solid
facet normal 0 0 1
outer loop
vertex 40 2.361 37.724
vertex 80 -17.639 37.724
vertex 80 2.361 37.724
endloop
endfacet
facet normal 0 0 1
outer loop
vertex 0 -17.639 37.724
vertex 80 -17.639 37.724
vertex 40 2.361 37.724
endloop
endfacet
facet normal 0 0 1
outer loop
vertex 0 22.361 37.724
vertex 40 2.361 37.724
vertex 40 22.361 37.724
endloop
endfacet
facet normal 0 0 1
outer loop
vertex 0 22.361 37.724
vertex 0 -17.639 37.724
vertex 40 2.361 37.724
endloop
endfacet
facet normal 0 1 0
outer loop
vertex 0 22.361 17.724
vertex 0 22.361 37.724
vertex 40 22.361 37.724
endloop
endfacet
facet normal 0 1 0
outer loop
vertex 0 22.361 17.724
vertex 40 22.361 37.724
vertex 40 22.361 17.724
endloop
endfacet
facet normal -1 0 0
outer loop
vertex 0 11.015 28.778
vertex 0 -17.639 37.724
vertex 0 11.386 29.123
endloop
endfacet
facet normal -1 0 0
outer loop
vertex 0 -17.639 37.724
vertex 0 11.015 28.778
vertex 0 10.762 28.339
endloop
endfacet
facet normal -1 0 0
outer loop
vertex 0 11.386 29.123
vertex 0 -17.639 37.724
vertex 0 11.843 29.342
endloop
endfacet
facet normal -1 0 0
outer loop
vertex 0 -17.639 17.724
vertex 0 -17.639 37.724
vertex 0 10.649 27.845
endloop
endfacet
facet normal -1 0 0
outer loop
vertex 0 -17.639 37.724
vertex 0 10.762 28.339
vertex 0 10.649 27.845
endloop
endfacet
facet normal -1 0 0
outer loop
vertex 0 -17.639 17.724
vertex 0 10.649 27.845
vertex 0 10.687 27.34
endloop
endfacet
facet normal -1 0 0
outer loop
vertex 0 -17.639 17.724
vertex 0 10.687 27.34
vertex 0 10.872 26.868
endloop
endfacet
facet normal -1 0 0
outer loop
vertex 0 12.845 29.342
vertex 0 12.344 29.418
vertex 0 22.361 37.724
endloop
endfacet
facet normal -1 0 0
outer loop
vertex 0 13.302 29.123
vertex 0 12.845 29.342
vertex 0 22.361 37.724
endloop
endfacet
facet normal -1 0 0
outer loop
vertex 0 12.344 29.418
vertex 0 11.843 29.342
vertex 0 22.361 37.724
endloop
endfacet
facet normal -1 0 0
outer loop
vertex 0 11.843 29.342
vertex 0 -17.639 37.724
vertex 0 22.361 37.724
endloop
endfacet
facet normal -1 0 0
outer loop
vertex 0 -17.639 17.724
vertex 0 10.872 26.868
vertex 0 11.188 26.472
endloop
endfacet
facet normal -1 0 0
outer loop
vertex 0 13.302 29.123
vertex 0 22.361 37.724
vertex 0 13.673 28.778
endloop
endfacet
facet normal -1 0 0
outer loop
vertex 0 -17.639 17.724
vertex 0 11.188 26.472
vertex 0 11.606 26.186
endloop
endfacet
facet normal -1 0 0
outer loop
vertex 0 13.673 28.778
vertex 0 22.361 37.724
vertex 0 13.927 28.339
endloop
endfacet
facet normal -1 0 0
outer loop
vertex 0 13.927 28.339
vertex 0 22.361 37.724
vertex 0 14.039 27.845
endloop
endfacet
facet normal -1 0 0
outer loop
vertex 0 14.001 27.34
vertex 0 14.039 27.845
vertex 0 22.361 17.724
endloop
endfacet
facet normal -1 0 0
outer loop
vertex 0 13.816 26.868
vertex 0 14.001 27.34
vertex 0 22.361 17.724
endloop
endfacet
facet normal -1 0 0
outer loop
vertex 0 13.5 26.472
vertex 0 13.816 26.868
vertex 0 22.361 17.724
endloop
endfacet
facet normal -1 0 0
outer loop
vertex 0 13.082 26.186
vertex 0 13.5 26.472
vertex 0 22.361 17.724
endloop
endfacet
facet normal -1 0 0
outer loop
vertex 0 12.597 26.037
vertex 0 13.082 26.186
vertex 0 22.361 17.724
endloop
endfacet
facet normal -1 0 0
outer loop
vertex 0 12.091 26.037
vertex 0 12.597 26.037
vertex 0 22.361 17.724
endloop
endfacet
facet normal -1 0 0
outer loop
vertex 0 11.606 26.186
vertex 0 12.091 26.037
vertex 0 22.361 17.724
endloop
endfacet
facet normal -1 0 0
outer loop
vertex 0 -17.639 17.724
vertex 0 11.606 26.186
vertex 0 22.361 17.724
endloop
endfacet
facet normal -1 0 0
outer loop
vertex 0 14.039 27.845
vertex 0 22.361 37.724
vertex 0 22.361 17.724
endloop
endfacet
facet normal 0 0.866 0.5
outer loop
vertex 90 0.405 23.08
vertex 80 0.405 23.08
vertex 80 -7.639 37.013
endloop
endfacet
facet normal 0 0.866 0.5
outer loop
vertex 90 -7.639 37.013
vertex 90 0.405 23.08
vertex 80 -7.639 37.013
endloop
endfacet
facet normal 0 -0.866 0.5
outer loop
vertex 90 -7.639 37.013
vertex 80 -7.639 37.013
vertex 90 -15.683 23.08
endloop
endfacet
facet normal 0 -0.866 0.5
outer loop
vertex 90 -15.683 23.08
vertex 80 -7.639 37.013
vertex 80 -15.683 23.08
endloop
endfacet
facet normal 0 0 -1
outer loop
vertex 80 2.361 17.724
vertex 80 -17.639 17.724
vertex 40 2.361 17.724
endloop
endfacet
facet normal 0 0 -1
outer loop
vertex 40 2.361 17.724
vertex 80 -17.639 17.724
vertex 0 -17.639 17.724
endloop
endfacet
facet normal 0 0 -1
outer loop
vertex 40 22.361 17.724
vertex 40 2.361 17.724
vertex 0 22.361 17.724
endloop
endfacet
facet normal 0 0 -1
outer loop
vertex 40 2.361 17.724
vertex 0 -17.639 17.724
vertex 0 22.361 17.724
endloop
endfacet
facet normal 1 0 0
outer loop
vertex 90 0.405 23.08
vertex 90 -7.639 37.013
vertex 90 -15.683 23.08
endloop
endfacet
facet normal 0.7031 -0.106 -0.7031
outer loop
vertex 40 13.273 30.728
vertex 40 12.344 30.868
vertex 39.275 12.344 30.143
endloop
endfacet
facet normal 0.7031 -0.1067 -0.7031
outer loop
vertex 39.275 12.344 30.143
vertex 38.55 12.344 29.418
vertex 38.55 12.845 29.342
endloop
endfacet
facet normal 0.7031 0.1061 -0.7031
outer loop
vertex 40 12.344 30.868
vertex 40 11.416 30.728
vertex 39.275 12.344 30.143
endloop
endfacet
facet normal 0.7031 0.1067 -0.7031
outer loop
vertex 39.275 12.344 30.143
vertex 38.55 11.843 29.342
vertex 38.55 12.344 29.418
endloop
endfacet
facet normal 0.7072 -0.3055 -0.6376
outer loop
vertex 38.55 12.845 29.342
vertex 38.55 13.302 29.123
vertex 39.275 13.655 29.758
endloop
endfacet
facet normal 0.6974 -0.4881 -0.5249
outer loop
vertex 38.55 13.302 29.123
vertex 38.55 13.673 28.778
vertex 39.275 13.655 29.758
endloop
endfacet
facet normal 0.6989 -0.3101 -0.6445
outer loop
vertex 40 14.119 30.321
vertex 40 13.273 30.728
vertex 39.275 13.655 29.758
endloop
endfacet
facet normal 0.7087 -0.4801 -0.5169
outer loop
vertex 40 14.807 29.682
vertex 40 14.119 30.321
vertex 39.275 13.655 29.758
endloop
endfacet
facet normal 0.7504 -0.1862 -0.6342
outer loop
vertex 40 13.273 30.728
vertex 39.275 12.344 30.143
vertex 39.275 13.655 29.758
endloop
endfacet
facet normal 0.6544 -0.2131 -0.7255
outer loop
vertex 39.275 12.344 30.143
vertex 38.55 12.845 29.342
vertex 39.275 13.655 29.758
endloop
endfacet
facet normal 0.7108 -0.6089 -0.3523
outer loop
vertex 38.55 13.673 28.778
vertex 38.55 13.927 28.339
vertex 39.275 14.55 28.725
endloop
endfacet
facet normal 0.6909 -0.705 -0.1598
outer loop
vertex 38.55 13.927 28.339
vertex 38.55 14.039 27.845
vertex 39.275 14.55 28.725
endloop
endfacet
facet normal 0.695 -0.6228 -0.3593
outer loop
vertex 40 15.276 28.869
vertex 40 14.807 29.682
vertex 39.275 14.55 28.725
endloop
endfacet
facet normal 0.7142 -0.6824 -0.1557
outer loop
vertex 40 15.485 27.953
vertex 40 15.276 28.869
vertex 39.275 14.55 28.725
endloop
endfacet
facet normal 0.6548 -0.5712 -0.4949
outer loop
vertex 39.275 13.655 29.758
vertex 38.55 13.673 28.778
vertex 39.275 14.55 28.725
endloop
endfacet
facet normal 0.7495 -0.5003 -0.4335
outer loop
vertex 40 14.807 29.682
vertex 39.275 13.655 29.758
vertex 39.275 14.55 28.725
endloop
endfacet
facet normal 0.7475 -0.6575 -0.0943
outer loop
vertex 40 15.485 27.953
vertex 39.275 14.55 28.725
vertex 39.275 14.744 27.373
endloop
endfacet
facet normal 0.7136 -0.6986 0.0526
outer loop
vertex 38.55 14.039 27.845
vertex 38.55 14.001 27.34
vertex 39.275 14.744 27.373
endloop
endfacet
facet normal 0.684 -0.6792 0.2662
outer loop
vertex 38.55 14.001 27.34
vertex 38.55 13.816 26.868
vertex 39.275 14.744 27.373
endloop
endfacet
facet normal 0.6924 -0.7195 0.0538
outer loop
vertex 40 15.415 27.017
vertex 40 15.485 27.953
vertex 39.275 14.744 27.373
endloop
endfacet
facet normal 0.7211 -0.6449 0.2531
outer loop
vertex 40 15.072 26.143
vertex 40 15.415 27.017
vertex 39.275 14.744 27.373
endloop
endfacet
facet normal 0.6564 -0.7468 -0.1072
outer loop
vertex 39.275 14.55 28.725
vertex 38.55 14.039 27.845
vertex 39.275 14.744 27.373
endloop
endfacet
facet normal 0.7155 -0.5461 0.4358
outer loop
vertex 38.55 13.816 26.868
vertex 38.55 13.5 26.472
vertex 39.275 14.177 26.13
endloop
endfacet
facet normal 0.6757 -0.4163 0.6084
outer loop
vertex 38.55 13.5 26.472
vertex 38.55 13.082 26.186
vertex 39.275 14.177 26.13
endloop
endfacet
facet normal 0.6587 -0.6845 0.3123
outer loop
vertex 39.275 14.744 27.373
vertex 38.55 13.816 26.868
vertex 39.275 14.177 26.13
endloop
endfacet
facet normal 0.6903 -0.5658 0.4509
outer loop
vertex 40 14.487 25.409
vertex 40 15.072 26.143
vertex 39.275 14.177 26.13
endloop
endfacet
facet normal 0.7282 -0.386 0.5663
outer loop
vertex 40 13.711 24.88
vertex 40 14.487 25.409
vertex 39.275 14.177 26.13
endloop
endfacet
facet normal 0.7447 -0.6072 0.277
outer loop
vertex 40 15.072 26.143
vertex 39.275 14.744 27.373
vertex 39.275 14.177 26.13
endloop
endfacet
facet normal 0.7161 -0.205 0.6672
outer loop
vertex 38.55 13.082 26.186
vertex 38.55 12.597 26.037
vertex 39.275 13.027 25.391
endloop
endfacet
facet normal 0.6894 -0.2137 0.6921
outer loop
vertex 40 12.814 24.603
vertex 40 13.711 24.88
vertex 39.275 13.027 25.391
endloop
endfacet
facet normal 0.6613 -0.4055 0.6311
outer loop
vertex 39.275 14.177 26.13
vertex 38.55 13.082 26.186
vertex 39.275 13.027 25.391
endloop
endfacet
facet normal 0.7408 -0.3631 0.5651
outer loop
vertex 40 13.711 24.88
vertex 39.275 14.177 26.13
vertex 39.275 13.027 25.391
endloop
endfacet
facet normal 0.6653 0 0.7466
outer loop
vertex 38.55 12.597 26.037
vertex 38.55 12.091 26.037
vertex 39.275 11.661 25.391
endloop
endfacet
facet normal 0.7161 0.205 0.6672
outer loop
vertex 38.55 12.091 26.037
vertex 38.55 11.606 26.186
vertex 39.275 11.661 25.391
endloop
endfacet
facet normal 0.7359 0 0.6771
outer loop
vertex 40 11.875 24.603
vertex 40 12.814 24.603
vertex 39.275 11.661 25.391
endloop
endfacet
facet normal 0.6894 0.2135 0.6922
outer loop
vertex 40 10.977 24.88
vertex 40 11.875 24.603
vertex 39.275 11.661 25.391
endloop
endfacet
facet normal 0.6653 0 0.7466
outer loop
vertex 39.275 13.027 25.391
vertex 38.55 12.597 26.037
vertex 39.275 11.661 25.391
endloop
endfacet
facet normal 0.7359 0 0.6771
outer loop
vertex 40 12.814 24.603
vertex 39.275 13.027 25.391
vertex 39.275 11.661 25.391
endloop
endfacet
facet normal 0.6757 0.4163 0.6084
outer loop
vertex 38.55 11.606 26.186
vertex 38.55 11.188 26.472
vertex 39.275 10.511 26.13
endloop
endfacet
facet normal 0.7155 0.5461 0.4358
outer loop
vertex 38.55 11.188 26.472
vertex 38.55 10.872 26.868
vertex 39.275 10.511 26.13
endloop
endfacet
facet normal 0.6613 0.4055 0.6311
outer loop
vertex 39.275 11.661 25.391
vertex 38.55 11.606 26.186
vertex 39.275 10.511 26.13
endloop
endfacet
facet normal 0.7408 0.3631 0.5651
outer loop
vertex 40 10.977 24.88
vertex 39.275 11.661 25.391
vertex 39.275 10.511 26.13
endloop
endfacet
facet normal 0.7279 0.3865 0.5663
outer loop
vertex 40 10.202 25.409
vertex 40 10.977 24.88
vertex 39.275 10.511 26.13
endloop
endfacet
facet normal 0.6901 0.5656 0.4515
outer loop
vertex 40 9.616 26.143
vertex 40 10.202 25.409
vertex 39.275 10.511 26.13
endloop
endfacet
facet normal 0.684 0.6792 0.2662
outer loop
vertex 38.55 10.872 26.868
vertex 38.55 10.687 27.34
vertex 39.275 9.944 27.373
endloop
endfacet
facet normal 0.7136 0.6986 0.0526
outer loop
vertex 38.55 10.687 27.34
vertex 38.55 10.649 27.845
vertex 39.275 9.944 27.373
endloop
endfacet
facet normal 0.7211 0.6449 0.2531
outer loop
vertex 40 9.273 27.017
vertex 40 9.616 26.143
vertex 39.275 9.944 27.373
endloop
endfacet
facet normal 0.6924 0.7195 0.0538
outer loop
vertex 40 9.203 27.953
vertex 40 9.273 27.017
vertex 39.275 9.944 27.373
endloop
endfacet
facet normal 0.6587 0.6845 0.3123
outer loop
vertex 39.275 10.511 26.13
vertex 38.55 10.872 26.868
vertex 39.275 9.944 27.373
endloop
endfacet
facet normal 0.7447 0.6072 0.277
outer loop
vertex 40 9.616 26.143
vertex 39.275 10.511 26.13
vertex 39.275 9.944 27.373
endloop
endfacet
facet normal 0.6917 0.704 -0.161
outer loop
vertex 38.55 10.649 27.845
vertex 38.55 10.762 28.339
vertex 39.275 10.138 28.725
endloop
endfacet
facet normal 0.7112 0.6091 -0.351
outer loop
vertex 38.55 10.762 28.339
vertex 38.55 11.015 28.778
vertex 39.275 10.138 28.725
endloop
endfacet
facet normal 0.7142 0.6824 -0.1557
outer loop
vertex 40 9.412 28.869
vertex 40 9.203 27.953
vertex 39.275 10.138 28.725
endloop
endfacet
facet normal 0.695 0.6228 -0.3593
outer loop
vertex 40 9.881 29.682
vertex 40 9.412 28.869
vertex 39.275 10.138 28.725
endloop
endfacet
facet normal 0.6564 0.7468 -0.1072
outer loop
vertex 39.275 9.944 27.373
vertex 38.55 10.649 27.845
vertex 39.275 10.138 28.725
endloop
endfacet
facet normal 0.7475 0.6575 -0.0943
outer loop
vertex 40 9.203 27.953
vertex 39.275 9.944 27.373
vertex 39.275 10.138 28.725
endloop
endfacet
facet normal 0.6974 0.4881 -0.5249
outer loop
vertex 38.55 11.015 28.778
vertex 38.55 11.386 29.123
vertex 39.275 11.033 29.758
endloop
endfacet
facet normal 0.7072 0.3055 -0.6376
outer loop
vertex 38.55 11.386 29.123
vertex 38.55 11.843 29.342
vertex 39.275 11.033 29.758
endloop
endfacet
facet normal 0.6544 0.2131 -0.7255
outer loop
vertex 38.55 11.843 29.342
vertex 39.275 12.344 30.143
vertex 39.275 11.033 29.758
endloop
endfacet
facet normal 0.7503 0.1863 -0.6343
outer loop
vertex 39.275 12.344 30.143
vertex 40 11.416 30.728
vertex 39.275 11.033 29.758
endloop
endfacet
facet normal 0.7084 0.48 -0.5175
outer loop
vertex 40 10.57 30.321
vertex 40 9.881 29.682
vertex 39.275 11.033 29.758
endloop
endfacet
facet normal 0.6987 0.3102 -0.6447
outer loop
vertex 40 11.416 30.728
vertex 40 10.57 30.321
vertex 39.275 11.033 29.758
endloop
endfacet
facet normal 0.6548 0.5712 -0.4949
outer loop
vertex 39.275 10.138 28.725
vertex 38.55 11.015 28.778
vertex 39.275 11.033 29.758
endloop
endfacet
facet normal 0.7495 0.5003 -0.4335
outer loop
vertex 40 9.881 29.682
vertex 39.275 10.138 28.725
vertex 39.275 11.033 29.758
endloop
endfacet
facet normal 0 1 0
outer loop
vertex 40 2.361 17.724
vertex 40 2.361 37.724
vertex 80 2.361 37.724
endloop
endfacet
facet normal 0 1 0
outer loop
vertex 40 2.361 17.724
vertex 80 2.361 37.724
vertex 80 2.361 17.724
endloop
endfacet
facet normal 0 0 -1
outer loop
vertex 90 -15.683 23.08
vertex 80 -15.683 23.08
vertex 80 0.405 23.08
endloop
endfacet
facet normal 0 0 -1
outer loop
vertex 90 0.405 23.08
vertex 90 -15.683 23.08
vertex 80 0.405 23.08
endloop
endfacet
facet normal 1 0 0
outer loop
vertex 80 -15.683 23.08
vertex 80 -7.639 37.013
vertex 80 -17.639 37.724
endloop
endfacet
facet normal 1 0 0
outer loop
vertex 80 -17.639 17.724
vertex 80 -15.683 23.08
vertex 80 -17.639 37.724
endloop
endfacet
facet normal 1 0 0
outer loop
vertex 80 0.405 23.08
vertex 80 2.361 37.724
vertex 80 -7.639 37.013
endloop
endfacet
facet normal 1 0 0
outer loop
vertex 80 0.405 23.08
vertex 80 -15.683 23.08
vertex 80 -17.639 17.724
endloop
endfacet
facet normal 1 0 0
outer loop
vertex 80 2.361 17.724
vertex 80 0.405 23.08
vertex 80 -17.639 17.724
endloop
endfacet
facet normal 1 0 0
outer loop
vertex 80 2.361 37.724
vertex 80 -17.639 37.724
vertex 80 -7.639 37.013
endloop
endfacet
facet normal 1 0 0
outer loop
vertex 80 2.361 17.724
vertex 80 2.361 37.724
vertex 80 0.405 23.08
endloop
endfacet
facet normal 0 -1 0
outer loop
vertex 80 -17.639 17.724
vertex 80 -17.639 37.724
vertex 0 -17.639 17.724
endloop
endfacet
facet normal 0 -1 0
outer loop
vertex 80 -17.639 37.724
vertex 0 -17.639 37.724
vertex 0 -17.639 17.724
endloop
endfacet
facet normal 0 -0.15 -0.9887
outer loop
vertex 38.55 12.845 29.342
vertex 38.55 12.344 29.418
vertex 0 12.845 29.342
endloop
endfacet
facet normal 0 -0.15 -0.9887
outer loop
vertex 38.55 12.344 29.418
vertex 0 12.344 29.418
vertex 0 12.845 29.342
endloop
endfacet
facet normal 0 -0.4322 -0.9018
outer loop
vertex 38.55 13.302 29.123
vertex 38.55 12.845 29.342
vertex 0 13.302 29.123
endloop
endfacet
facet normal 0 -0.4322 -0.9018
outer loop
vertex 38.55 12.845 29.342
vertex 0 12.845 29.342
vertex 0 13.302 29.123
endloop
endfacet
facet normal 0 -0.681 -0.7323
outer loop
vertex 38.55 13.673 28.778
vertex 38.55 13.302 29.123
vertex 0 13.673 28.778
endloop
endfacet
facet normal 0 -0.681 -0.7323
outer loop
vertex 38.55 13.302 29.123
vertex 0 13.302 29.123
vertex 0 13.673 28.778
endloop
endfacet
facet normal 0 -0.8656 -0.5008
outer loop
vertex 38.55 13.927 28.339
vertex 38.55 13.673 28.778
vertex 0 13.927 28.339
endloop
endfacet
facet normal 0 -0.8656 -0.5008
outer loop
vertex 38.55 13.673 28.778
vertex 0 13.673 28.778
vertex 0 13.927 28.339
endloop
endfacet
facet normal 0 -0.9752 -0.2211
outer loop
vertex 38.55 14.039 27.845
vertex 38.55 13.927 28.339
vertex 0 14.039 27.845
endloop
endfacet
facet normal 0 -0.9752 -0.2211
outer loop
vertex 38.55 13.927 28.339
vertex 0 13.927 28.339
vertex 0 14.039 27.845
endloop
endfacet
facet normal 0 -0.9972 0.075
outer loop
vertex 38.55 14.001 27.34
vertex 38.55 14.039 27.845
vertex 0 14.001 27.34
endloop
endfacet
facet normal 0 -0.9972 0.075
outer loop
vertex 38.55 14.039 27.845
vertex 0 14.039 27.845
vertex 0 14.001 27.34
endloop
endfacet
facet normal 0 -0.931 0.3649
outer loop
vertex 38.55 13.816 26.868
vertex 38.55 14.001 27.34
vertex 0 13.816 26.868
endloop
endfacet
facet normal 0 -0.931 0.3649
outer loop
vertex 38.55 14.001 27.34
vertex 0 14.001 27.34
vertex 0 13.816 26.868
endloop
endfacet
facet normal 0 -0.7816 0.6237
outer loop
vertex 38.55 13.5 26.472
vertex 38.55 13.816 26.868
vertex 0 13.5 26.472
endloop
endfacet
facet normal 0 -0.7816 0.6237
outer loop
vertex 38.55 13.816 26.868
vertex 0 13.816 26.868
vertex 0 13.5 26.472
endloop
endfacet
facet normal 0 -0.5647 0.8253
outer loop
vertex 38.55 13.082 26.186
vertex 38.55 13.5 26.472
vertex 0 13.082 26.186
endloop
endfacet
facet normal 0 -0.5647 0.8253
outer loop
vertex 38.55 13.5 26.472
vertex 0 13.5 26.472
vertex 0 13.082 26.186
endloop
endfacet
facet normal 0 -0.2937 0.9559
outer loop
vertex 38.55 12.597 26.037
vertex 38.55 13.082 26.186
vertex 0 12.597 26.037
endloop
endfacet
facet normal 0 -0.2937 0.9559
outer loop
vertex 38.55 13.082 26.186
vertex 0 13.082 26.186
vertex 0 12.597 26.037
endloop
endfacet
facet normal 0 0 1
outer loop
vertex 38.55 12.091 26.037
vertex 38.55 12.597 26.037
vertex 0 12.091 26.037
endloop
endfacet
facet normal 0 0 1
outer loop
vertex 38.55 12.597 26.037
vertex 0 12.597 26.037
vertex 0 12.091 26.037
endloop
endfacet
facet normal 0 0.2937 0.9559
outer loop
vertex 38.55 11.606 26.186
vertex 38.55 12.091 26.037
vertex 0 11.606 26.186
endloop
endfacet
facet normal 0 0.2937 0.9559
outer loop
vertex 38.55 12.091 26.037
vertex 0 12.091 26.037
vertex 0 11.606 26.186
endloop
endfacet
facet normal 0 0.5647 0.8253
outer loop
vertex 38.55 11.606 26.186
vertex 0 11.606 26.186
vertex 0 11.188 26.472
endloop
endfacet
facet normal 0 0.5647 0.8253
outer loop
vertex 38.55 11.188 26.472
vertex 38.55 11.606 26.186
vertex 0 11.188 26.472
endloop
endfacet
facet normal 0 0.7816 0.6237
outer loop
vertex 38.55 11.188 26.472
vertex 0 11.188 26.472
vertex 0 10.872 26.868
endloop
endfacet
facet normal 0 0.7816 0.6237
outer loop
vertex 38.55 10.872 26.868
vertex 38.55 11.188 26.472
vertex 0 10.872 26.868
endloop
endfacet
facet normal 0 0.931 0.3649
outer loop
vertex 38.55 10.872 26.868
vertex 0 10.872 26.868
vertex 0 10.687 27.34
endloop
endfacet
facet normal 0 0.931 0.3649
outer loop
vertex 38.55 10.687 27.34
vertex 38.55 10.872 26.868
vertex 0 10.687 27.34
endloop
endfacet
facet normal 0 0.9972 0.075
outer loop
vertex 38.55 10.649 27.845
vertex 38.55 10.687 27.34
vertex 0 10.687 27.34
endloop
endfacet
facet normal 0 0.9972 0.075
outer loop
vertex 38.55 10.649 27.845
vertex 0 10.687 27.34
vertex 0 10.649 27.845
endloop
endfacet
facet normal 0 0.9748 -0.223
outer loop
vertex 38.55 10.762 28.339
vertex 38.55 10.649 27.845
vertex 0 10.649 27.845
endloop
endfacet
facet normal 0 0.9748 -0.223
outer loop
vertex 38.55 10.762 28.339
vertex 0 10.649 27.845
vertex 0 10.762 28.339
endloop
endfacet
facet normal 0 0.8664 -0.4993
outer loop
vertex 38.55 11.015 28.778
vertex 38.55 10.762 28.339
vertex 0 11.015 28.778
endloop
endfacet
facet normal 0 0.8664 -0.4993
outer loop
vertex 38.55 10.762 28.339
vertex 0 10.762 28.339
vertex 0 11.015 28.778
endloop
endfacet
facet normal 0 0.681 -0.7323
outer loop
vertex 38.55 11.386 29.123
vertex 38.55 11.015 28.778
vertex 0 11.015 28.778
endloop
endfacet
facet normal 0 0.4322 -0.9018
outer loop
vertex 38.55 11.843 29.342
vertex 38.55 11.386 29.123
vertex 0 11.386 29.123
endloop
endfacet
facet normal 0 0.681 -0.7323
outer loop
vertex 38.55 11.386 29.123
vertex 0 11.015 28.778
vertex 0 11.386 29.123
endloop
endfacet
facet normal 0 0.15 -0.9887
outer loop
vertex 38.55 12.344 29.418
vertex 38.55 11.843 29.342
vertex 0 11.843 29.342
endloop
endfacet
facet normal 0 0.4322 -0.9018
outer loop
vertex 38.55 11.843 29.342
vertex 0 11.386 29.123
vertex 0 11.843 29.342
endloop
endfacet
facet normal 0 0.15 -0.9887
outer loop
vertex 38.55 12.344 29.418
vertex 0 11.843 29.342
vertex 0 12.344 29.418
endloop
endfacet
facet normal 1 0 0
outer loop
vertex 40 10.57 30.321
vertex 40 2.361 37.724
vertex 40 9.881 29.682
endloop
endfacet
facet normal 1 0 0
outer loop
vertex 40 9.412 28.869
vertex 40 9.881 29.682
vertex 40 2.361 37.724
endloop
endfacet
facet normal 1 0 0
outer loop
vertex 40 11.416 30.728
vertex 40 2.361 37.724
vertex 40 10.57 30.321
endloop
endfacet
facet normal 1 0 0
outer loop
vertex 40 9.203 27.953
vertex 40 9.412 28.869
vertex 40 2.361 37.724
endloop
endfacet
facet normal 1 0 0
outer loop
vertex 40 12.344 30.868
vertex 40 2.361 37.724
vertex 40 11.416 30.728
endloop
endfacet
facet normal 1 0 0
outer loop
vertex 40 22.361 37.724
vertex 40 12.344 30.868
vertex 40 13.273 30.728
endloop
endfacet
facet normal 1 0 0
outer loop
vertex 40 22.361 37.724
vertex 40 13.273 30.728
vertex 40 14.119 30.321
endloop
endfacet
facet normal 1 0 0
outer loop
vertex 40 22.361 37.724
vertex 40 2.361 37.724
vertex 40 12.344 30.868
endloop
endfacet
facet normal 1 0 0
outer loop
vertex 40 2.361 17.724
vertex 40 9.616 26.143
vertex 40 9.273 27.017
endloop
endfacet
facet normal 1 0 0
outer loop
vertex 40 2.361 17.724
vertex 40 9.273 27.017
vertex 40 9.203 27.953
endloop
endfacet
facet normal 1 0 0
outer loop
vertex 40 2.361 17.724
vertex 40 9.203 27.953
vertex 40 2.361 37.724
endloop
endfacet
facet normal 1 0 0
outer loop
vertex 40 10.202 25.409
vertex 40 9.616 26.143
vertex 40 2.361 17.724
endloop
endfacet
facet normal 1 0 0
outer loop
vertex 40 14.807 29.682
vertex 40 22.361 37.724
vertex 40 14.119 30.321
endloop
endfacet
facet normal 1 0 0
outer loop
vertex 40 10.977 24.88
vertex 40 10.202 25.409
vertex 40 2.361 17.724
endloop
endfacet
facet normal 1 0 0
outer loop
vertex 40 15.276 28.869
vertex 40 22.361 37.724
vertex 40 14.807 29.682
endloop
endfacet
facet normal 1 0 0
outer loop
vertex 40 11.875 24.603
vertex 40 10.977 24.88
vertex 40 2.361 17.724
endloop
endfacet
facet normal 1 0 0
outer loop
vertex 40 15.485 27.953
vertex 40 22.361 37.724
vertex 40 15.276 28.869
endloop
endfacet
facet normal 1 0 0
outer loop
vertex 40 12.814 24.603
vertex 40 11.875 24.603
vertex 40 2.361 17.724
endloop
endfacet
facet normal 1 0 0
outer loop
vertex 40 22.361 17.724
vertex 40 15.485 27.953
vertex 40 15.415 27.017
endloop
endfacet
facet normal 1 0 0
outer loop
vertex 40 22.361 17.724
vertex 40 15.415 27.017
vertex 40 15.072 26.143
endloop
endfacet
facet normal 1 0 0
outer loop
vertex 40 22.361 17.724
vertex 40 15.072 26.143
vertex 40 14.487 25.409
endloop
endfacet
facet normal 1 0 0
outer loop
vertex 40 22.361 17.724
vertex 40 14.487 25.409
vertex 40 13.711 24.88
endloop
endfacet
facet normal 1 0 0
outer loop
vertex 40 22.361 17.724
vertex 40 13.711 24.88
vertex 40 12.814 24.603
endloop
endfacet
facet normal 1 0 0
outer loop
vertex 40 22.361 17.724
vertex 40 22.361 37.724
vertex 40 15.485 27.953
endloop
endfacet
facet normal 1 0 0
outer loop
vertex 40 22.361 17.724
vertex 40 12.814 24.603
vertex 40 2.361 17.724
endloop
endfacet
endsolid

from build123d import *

# Parameters (mm, degrees)
SKETCH_1_W                  = 20
SKETCH_1_H                  = 40
EXTRUDE_1_DEPTH             = 40
SKETCH_16_W                 = 20
SKETCH_16_H                 = 20
EXTRUDE_2_DEPTH             = 40
HOLE_WIZARD_M31_D           = 3.4
HOLE_WIZARD_M31_CSINK_D     = 6.3
HOLE_WIZARD_M31_CSINK_ANGLE = 90
EXTRUDE_3_DEPTH             = 10


with BuildPart() as part:
    # Эскиз1 → Бобышка-Вытянуть1 (new body)
    with BuildSketch(Plane(origin=(0, 0, 0), x_dir=(0, 0, -1), z_dir=(1, 0, 0))):
        with Locations((-27.72412662, 2.360988518)):
            Rectangle(SKETCH_1_W, SKETCH_1_H)
    extrude(amount=EXTRUDE_1_DEPTH)

    # Эскиз16 → Бобышка-Вытянуть2 (add)
    with BuildSketch(Plane(origin=(40, 0, 0), x_dir=(0, 0, -1), z_dir=(1, 0, 0))):
        with Locations((-27.72412662, -7.639011482)):
            Rectangle(SKETCH_16_W, SKETCH_16_H)
    extrude(amount=EXTRUDE_2_DEPTH)

    # Зенковка для винта с полупотайной головкой M31 (through all)
    with Locations(Plane(origin=(40, 0, 0), x_dir=(0, 0, -1), z_dir=(1, 0, 0))):
        with Locations((-27.717933157, 12.344098424)):
            CounterSinkHole(HOLE_WIZARD_M31_D / 2, HOLE_WIZARD_M31_CSINK_D / 2, counter_sink_angle=HOLE_WIZARD_M31_CSINK_ANGLE)

    # Эскиз19 → Бобышка-Вытянуть3 (add)
    with BuildSketch(Plane(origin=(80, 0, 0), x_dir=(0, 0, -1), z_dir=(1, 0, 0))):
        Polygon((-37.01304766, -7.639011482), (-23.0796661, -15.683453077), (-23.0796661, 0.405430112), align=None)
    extrude(amount=EXTRUDE_3_DEPTH)


solid = part.part
